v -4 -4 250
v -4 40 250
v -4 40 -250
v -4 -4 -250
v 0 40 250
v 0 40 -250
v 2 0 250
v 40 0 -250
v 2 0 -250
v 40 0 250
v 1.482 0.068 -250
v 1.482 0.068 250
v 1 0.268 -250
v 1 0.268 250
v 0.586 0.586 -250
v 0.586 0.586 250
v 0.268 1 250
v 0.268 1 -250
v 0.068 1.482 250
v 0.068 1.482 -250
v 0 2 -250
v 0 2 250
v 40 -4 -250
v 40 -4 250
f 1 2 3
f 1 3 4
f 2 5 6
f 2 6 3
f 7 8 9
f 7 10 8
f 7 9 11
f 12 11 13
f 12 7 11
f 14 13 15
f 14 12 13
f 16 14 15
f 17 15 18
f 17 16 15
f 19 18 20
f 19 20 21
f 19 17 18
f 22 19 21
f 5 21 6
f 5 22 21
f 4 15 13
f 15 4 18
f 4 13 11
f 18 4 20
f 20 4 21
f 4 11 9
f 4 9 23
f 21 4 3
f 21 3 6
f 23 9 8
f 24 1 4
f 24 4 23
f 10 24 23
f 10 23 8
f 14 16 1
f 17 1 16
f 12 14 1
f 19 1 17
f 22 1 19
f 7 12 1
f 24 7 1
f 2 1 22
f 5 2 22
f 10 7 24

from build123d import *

# Parameters (mm, degrees)
SALIENTE_EXTRUIR1_DEPTH = 250


with BuildPart() as part:
    # Croquis1 → Saliente-Extruir1 (new, symmetric)
    with BuildSketch(Plane.XY):
        with BuildLine():
            Line((0, 2), (0, 40))
            Line((0, 40), (-4, 40))
            Line((-4, 40), (-4, -4))
            Line((-4, -4), (40, -4))
            Line((40, -4), (40, 0))
            Line((40, 0), (2, 0))
            ThreePointArc((2, 0), (0.585786438, 0.585786438), (0, 2))
        make_face()
    extrude(amount=SALIENTE_EXTRUIR1_DEPTH, both=True)


solid = part.part
